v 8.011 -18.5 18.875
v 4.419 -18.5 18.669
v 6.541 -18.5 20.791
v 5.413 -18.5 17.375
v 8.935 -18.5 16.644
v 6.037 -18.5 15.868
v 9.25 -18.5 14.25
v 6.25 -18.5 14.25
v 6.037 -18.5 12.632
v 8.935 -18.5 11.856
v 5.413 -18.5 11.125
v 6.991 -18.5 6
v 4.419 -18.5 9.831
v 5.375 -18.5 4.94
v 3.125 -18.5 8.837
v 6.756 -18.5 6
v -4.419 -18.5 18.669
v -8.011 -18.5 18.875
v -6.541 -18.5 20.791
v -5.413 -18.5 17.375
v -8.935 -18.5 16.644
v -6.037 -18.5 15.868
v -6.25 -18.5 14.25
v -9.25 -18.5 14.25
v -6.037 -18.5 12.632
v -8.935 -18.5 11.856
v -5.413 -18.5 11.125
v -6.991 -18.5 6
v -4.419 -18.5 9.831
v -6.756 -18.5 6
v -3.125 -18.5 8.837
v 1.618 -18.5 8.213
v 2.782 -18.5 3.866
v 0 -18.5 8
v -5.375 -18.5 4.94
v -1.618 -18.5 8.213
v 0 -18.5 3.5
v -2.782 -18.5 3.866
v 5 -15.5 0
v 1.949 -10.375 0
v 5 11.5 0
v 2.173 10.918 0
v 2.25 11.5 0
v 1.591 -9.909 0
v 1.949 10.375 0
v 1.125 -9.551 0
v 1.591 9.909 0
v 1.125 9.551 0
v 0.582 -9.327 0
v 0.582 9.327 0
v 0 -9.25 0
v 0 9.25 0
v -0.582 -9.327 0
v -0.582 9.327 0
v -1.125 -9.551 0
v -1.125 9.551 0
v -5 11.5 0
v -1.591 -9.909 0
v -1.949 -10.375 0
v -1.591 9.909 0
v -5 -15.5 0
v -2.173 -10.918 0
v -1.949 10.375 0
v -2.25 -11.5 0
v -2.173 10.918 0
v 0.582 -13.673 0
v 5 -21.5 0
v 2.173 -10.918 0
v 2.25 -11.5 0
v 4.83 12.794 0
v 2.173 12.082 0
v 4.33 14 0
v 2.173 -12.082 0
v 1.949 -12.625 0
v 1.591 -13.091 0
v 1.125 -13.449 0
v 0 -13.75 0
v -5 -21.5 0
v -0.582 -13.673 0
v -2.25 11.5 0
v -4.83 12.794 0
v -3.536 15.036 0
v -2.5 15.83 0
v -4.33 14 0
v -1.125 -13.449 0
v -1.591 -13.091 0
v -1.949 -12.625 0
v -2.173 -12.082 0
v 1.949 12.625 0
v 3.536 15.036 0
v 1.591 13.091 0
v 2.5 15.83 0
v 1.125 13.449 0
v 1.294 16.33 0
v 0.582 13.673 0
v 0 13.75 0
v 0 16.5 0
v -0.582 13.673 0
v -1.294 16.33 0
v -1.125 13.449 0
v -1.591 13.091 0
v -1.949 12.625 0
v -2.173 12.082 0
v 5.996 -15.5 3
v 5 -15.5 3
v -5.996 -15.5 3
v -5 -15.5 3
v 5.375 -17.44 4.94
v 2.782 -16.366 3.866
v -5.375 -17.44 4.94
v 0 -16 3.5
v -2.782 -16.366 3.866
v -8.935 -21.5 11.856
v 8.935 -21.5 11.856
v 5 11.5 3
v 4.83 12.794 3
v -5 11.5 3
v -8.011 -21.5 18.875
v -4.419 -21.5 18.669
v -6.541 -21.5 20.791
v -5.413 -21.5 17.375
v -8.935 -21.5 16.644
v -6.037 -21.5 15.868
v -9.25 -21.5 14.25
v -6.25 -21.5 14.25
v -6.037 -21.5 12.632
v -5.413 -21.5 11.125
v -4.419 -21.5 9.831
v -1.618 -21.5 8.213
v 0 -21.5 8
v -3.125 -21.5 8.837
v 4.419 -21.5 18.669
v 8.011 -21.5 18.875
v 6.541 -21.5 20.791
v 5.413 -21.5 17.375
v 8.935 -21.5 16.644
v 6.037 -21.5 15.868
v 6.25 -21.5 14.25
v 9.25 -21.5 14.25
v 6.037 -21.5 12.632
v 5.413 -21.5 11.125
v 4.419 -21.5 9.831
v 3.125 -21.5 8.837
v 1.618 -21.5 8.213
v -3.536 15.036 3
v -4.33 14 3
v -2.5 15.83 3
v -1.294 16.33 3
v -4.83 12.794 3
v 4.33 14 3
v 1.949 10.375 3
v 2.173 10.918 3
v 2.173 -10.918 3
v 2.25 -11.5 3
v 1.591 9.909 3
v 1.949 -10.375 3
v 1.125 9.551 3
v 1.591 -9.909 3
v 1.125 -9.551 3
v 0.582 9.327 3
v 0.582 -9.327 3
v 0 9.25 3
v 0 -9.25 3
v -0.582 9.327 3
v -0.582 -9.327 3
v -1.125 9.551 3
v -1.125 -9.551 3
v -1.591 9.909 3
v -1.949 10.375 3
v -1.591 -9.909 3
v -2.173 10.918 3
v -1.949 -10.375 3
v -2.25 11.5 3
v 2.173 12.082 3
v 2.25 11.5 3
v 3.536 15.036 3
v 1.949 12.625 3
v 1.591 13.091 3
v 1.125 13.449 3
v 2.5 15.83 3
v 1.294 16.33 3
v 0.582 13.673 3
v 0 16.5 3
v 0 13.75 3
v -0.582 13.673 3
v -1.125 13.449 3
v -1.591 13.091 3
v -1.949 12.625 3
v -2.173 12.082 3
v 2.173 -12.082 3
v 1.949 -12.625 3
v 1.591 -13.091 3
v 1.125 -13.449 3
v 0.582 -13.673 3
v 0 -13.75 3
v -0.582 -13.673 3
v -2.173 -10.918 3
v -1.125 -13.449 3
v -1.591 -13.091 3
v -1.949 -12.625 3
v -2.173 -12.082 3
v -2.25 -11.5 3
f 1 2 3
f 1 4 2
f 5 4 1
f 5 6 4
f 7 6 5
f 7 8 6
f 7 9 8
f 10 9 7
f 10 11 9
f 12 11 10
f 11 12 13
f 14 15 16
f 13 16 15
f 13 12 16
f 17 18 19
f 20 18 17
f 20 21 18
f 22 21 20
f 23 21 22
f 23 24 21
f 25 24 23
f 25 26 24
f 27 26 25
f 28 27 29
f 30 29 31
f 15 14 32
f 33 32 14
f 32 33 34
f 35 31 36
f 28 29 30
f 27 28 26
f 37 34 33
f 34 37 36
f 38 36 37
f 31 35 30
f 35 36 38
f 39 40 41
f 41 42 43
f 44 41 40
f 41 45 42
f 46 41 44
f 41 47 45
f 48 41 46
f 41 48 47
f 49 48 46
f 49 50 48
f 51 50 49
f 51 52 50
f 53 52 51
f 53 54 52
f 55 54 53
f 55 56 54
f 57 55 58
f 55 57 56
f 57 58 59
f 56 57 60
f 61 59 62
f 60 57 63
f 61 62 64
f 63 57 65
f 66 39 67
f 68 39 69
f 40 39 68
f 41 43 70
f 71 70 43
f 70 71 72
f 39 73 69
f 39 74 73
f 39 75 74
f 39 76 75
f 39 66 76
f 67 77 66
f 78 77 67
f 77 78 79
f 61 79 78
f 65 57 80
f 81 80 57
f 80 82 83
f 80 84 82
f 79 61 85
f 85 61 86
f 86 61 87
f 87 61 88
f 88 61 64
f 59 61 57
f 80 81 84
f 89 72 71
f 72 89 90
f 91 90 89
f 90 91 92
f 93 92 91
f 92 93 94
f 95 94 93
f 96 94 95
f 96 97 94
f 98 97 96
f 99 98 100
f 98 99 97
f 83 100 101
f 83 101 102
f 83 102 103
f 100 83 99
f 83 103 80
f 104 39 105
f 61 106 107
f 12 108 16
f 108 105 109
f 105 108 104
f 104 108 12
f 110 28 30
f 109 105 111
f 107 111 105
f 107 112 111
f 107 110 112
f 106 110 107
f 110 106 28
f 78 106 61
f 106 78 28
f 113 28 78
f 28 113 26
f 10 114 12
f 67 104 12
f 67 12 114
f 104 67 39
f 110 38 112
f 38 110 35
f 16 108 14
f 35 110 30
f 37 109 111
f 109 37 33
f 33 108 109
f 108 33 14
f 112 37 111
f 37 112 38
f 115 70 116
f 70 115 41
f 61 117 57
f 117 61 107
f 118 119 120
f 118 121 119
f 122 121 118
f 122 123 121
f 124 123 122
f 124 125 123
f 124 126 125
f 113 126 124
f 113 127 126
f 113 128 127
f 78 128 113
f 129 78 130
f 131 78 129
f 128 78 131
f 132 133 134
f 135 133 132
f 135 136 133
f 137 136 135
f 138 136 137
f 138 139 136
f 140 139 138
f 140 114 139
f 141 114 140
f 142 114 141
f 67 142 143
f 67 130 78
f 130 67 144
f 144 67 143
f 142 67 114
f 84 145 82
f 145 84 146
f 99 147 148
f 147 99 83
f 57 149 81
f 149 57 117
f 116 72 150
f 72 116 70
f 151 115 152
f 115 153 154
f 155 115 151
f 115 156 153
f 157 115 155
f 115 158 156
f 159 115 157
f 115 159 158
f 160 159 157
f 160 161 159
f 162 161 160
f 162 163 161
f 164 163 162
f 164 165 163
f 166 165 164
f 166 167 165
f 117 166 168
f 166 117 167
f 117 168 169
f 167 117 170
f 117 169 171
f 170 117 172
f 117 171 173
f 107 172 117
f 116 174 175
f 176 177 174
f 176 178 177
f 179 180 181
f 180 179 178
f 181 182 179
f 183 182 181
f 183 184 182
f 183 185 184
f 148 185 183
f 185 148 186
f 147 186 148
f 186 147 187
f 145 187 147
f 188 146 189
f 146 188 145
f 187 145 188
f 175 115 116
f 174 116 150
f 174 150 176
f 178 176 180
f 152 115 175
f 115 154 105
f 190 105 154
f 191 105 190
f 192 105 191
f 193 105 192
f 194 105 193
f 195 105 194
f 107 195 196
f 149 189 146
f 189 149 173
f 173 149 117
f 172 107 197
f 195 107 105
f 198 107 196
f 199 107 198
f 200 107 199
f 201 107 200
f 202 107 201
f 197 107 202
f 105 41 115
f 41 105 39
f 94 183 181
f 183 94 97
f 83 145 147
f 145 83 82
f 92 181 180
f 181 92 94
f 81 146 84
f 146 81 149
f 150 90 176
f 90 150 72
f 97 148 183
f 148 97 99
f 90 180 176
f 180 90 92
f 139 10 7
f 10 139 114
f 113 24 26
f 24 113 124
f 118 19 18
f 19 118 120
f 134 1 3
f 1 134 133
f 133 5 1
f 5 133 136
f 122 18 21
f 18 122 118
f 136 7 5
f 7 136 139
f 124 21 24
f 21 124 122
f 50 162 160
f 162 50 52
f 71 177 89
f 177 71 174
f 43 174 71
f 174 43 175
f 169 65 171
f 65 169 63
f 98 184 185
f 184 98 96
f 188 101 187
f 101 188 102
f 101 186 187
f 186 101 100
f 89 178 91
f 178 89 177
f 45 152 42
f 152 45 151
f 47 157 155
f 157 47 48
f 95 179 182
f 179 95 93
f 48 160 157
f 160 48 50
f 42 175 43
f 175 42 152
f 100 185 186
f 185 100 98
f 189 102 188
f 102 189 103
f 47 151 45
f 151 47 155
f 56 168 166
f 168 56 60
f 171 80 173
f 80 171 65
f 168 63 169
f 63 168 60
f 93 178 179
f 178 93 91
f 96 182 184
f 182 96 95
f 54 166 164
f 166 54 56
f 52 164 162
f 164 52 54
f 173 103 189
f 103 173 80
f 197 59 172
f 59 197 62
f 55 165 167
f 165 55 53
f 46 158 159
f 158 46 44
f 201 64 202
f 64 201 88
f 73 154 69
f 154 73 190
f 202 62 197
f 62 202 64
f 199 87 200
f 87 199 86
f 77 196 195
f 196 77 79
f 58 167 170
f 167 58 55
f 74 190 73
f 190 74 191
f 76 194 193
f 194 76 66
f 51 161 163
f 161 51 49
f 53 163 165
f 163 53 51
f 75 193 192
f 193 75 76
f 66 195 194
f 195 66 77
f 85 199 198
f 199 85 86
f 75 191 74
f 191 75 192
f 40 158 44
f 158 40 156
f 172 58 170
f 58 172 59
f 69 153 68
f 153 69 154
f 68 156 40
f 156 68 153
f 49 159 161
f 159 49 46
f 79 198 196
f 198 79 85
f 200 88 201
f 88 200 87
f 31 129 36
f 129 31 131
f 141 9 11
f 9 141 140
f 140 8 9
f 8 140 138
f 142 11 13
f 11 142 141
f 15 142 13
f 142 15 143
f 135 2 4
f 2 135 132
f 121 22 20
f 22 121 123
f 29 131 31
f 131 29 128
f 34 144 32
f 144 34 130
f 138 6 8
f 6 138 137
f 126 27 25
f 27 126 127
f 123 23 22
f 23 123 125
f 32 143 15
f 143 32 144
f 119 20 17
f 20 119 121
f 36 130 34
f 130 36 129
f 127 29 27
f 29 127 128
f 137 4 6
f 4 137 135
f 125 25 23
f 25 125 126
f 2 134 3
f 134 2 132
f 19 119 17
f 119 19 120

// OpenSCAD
// file: modules.scad
// Fonctions personnalisées

//http://forum.openscad.org/Wish-mirror-copy-true-td10681.html
module copy_mirror(vec=[0,1,0])
{
    children();
    mirror(vec) children();
}

module ecrou(plat,h){
  cylinder(d=plat*2/sqrt(3), h=h, $fn=6);
}


module courroie(diam,longueur){
  color ("black")
  difference(){
    hull(){
      cylinder(d=diam+1, h=6, $fn=32);
      translate([longueur,0,0]) cylinder(d=diam+1, h=6, $fn=32);
    }
    translate([0,0,-1])
    hull(){
      cylinder(d=diam-1, h=8, $fn=32);
      translate([longueur,0,0]) cylinder(d=diam-1, h=8, $fn=32);
    }
  }
  
  
}
// file: config.scad
// Paramètres de la machine

decal=-30;            // décallage du chassis xz
hauteur=400;          // hauteur totale chassis
largeur=400;          // largeur totale chassis
longueur=470;         // longueur totale chassis
hauteur_base=90;      // hauteur de la base
entraxe_y=140;        // distance entre les tiges Ø8 axe Y
entraxe_x=45;         // distance entre les tiges Ø8 axe X

couleur=[1,0.6,0];


// Plats écrous
ec3=5.7;
ec4=7.2;
ec5=8.2;
ec6=10.2;

// Jeu sur plats pour les écrous glissants
jec=0.2;

// hauteur écrous
ec3h=2.4;
ec4h=3.2;
ec5h=4.7;
ec6h=5.2;

// Vis
vis3=3.5;
vis4=4.5;
vis5=5.5;
vis6=6.5;


// Paramètre des pièces et jeux

// écart plateau/courroie
// y_belt_holder
belt_h=13;      // écart entre la courroie et le plateau

// écart plateau/tiges lisses
// y_lm8uu
decal_plateau=12; // Décallage en Y

// décallage des tiges lisses Y
// support_tige8_y
decal_tiges=5;

// décallage moteur Y
// y_motor
decal_motory_z=11;
decal_motory_y=25;

// Equerres de fixation position fermée
eq_ec=10;      // écart entre profilés

// Fixations axe Z
pos_z=26;      // position des axes par rapport au profilé (>= 21)
hauteur_z=20;  // hauteur des fixations
entraxe_z=17;  // distance entre les tiges Ø8 et M5
// est ce que la tige de 8 dépasse du profilé de 30?
// si oui, on décale les fixations
decalx=max(-42/2+entraxe_z+8/2+2, 0);

// Roulements linéaires
lbd = 15; // diamètre ext
lbh = 24; // hauteur

// x_carriage
he_x=23;  // entraxe hotend x
he_y=23;  // entraxe hotend y
sen_x=20; // entraxe capteur x
sen_y=23; // entraxe capteur y

// sensor_holder
sen_ep=3;   // épaisseur
sen_d=12.5; // diamètre du capteur
sen_pos=0;  // décentrage en x du capteur
sen_z=7;    // position Z de la bague

// y_belt_idler
ybi_ep1=4;       // épaisseur de la partie fixe
ybi_ep2=4;       // épaisseur de la partie mobile
ybi_h=16;        // position de l'axe
ybi_ec=11;       // écart pour le passage du ou des roulement
ybi_vis=vis4;    // diamètre passage de vis (axe)
ybi_ecrou=ec4;   // plat écrou
ybi_ecrouh=ec4h; // hauteur écrou
ybi_long=60;     // longueur de la partie mobile entre axes
ybi_prof=15;     // largeur de la partie mobile


// nombre de dents des poulies
poulie=20;

// Pas des courroies
pas=2;

// diamètre des poulies
dpoulie=poulie*pas/3.1416;
// main file
// eLKa1
// sensor_holder
// GNU GPL v3
// lkiefer <blog.lkiefer.org> and contributors
// http://www.reprap.org/wiki/ELKa
// https://github.com/kimented/elka1

include <config.scad>;
use <modules.scad>;

module sensor_holder(ep,d){
  echo ("sensor_holder");
  $fn=24;
  ch=3;
  color (couleur)
  difference(){
    union(){
      // Fixations
      hull(){
        translate([0,sen_y/2]) cylinder(d=10,h=sen_ep);
        translate([-5,-sen_y/2-sen_ep-sen_z,0]) cube([10,sen_ep,sen_ep]);
      }
      // Collier
      hull(){
        translate([-5,-sen_y/2-sen_ep-sen_z,0]) cube([10,sen_ep,sen_ep]);
        translate([sen_pos,-sen_y/2-sen_ep-sen_z,sen_d/2+sen_ep+5]) rotate([-90,0,0]) cylinder(d=sen_d+2*sen_ep,h=sen_ep);
      }
      // Renforts
      difference(){
        intersection(){
          translate([sen_d/2+sen_ep+sen_pos,-sen_y/2-sen_z,0])
          rotate([0,-90,0]) linear_extrude(sen_d+2*sen_ep+2*sen_pos) polygon([[0,0],[0,ch],[sen_ep,ch],[ch+sen_ep,0]]);
          hull(){
            translate([-5,-sen_y/2-sen_z,0]) cube([10,ch,sen_ep]);
            translate([sen_pos,-sen_y/2-sen_z,sen_d/2+sen_ep+5]) rotate([-90,0,0]) cylinder(d=sen_d+2*sen_ep,h=ch);
          }
        }
        // Dégagement écrou capteur
        translate([sen_pos,-sen_y/2-sen_z,sen_d/2+sen_ep+5]) rotate([-90,0,0]) cylinder(d=sen_d+2*sen_ep+3,h=ch);
      }
    }
    // Trous de fixation
    copy_mirror([0,1,0])
    translate([0,sen_y/2,-1])
    cylinder(d=vis4, h=sen_ep+2);
    // Trou collier
    translate([sen_pos,-sen_y/2-sen_ep-sen_z-1,sen_d/2+sen_ep+5]) rotate([-90,0,0]) cylinder(d=sen_d,h=sen_ep+2);
    // Découpe quart de cercle
    translate([sen_pos,-sen_y/2-sen_ep-sen_z-1,sen_d/2+sen_ep+5]) rotate([0,-45,0]) cube ([sen_d+sen_ep,sen_ep+2,sen_d+sen_ep]);
  }
  
}

sensor_holder();
//translate([-he_x/2-sen_x,sen_y/2,0])
